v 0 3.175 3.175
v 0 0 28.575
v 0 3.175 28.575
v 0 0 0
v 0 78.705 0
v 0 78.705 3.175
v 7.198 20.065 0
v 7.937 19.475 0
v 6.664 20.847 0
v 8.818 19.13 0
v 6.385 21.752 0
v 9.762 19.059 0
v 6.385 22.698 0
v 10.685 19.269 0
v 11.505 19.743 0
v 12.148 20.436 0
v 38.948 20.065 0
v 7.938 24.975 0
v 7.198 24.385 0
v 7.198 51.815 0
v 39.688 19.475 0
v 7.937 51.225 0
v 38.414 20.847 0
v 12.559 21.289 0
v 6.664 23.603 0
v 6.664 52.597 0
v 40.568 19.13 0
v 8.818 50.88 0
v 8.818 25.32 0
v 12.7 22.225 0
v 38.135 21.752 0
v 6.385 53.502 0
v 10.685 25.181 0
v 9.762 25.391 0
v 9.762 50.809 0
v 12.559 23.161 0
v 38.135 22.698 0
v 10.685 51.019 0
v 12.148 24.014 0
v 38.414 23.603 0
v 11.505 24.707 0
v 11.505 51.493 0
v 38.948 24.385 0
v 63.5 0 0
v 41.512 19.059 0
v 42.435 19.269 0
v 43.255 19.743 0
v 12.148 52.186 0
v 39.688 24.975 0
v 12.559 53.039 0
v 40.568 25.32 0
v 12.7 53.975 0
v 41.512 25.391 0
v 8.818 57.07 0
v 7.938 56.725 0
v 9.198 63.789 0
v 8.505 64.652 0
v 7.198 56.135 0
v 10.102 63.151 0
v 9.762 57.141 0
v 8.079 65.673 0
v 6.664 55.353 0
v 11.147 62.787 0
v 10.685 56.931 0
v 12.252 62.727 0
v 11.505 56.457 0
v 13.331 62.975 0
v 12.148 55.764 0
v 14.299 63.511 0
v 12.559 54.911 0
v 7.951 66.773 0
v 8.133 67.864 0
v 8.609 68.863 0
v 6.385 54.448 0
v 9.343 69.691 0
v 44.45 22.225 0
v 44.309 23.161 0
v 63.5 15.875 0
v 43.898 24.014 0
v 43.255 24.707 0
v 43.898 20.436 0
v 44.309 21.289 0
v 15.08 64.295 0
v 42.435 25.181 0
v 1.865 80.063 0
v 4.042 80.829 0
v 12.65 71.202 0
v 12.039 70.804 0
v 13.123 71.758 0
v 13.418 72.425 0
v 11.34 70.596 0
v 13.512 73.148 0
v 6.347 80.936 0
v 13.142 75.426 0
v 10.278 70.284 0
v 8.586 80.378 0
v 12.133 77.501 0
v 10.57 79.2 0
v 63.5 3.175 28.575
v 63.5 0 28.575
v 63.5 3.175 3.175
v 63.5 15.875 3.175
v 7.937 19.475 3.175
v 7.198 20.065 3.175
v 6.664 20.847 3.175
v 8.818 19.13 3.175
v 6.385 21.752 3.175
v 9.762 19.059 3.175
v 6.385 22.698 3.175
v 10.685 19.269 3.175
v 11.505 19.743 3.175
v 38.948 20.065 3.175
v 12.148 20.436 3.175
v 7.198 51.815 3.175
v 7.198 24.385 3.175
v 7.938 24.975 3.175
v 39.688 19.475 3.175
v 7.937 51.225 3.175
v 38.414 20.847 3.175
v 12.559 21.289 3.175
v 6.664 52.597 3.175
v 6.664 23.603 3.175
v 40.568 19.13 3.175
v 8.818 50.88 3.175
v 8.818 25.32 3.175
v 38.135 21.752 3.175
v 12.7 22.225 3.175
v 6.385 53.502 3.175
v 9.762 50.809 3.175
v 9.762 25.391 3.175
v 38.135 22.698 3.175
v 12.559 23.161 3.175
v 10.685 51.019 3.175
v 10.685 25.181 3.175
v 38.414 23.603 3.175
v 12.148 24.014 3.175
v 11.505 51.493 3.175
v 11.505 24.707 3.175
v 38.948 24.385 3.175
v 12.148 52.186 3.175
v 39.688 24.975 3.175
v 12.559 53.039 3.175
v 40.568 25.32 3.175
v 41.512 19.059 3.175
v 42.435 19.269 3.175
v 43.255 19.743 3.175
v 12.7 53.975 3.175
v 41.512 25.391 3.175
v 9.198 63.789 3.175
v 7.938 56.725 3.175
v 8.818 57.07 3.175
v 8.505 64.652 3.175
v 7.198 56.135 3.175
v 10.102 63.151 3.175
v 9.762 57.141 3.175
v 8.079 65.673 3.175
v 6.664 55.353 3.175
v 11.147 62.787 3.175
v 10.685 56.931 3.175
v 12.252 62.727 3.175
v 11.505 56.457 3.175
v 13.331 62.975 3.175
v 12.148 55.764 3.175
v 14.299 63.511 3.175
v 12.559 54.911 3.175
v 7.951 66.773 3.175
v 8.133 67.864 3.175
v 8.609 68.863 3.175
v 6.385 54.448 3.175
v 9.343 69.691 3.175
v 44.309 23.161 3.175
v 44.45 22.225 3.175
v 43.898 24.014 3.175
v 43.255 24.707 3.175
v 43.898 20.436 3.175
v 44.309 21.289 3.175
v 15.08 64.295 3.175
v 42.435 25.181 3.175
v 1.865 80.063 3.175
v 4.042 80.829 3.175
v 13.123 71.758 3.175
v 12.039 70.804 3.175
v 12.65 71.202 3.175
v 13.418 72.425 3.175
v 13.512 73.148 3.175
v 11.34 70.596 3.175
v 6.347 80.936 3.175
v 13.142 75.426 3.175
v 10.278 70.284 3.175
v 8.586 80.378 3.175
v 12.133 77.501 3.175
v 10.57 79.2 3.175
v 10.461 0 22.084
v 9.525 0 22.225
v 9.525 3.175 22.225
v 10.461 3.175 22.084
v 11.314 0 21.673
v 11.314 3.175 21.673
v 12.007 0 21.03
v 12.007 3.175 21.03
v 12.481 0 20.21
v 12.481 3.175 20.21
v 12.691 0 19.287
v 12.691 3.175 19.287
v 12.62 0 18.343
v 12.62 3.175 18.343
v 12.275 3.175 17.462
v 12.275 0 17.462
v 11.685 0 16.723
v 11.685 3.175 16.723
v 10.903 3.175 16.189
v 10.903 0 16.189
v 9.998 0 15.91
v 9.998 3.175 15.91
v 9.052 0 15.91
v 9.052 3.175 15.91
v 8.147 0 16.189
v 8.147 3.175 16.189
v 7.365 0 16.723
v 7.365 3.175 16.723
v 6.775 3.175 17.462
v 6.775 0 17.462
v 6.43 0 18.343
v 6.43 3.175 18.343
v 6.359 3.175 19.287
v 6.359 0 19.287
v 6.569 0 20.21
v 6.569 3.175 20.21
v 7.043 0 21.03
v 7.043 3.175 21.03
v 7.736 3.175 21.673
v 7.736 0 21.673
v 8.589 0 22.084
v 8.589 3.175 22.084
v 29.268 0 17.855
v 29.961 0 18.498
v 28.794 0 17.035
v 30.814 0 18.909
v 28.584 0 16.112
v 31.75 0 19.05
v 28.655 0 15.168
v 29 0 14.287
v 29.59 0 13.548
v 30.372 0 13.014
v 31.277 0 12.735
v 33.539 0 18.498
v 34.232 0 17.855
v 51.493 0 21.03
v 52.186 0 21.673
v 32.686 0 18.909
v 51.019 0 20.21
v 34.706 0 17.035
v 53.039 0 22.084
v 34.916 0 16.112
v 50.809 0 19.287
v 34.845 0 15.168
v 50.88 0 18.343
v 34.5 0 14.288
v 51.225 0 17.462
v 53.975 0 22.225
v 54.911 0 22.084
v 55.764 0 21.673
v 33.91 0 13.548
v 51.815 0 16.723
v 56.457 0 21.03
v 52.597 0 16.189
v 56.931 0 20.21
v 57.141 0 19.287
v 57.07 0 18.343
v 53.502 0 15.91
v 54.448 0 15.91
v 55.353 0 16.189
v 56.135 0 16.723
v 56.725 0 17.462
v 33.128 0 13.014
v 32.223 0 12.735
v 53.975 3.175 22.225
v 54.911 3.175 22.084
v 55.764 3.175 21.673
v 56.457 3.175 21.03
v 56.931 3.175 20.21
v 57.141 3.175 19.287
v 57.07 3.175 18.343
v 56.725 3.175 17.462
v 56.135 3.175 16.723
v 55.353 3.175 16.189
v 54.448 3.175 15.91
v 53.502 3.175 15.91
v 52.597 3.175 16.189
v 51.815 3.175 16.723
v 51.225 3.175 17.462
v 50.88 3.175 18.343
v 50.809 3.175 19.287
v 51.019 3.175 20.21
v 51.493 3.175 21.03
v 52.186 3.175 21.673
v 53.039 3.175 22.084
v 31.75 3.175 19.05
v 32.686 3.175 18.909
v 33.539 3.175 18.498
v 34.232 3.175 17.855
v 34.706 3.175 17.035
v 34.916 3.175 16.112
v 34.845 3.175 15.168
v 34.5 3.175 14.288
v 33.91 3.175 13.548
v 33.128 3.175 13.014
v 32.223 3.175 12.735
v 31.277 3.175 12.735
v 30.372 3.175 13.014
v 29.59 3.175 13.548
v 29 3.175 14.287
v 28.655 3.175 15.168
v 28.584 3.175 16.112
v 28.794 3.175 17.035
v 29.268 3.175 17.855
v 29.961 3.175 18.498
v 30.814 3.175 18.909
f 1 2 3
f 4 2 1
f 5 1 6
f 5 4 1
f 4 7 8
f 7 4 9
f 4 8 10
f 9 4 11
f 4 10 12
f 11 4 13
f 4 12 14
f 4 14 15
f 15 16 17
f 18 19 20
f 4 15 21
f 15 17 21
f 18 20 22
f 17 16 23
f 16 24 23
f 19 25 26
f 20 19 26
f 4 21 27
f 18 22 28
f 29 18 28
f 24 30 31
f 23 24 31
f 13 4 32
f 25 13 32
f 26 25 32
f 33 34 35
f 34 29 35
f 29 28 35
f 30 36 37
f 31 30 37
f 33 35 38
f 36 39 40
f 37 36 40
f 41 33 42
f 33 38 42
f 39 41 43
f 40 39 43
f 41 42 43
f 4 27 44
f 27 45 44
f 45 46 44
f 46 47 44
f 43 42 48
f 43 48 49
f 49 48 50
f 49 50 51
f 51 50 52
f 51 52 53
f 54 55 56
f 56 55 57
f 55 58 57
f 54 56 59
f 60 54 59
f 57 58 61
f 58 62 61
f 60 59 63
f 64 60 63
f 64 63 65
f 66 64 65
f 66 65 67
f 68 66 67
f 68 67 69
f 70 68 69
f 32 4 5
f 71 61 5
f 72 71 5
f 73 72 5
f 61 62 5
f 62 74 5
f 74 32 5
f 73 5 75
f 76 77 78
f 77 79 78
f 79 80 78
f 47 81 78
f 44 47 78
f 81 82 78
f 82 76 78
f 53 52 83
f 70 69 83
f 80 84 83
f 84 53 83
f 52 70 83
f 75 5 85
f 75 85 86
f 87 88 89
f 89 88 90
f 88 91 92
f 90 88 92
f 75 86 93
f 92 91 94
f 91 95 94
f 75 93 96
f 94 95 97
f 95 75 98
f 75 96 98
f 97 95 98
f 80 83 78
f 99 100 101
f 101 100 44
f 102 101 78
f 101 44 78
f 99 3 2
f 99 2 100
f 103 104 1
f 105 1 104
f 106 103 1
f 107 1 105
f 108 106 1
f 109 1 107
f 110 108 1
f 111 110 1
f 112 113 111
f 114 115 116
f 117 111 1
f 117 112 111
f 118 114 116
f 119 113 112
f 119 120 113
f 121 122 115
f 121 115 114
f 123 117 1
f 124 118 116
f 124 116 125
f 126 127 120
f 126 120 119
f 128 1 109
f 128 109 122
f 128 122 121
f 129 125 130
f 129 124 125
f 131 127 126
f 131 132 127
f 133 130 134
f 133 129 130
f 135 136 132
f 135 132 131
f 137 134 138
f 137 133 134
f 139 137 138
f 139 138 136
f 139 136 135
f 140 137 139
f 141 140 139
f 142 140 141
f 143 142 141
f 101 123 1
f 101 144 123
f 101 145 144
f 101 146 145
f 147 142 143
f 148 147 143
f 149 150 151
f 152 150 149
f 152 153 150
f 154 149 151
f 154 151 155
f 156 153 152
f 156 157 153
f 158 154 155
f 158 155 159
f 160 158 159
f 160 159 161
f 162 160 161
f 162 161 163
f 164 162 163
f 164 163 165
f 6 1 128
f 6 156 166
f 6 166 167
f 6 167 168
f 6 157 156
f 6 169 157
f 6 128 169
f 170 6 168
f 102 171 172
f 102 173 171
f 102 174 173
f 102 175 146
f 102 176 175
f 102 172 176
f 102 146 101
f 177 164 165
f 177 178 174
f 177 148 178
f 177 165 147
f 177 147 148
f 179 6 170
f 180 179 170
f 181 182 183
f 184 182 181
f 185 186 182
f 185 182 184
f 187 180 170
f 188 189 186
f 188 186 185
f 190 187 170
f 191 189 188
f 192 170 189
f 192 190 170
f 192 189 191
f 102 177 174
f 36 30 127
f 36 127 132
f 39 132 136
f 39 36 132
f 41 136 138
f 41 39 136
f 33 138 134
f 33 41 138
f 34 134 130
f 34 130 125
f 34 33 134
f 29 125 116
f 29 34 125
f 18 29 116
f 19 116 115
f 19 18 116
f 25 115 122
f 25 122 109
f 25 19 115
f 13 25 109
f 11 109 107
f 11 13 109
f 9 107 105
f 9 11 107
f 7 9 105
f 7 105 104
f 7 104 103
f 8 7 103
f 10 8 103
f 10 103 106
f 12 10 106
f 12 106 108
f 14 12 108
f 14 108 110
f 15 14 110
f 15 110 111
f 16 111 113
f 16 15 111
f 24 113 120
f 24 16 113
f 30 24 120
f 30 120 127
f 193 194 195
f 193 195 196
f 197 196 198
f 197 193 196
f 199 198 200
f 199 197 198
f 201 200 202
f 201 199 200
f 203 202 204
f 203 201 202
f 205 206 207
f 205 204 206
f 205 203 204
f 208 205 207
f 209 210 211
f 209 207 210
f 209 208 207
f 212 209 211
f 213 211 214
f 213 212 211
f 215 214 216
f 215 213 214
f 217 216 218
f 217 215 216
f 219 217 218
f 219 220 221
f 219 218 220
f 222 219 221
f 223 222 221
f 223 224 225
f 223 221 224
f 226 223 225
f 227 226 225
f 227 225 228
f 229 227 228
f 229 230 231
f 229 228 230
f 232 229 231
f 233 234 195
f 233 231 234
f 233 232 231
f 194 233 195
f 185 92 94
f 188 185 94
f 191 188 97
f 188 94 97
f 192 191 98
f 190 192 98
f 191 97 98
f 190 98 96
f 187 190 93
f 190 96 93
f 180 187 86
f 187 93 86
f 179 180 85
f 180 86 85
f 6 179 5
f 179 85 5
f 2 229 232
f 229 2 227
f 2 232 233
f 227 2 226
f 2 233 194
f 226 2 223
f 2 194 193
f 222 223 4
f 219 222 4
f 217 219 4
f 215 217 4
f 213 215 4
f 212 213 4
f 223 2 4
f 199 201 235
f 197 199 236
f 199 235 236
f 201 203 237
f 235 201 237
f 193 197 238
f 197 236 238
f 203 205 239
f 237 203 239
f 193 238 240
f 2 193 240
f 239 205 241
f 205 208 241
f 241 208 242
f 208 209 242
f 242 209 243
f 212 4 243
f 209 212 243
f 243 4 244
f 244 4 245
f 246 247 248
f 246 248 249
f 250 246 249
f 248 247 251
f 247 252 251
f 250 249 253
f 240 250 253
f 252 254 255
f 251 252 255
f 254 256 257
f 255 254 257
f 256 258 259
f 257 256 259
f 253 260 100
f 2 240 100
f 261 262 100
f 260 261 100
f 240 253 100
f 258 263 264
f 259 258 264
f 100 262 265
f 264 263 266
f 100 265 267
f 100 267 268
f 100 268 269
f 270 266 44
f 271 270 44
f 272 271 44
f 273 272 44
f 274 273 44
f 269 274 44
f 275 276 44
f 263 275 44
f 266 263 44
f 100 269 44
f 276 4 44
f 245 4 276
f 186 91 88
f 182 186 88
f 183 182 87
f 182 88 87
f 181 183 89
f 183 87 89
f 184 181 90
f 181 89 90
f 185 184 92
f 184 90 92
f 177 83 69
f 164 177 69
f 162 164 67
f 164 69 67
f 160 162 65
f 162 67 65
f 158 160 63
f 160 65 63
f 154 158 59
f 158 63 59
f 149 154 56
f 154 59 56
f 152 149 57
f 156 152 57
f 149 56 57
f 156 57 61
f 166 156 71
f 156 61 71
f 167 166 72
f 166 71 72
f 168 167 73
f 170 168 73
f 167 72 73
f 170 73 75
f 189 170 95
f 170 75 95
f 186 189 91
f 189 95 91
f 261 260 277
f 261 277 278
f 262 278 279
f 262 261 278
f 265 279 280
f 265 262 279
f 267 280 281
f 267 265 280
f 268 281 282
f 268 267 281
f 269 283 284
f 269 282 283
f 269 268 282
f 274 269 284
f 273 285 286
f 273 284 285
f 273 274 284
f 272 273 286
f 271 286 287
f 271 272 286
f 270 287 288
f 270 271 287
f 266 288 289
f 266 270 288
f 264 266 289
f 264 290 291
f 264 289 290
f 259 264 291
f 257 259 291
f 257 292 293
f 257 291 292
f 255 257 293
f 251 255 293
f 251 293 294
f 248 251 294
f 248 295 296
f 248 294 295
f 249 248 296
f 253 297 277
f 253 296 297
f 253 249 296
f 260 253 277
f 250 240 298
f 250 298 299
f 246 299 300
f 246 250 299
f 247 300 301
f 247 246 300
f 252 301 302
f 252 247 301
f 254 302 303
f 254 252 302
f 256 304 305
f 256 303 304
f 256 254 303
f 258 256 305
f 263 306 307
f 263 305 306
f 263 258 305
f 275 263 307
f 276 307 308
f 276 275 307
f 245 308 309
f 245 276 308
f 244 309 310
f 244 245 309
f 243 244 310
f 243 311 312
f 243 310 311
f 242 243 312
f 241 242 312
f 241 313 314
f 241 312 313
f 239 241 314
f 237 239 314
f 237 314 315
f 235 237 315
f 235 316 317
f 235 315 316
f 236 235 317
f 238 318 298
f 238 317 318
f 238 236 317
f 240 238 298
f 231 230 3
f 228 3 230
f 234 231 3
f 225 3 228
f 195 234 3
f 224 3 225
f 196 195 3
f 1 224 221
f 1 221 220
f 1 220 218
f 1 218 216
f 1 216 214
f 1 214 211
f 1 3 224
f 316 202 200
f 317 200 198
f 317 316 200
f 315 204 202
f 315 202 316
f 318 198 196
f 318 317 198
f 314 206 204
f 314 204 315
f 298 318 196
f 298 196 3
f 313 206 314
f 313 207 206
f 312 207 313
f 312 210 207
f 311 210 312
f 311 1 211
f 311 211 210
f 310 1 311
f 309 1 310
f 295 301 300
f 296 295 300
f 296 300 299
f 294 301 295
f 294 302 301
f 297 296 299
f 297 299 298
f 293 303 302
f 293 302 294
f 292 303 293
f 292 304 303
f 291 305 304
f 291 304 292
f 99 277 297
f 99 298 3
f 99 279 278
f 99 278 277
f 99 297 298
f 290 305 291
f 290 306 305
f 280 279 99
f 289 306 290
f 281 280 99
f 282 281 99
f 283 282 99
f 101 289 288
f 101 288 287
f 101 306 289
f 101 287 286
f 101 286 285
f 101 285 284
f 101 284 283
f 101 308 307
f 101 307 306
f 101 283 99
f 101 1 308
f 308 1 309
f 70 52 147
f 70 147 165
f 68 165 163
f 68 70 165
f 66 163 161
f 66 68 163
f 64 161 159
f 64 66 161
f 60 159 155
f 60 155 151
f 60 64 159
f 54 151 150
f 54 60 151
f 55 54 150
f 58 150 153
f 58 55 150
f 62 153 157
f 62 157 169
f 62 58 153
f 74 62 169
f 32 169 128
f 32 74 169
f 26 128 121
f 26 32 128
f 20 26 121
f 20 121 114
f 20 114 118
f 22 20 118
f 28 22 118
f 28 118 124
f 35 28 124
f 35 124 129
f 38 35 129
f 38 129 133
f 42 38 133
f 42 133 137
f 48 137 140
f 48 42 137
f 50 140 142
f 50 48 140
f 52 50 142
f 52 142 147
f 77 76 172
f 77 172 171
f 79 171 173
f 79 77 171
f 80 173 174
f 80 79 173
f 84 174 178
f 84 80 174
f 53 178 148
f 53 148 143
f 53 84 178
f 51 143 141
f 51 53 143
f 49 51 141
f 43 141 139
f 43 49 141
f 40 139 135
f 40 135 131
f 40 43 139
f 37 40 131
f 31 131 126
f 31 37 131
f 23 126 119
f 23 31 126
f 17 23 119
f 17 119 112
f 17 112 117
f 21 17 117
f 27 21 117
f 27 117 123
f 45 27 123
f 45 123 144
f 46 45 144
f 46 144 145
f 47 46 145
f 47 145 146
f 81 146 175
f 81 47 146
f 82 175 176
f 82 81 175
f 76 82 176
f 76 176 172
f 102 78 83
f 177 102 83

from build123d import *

# Parameters (mm, degrees)
SKETCH1_R               = 3.175
BOSS_EXTRUDE1_DEPTH     = 3.175
SKETCH2_W               = 63.5
SKETCH2_H               = 3.175
BOSS_EXTRUDE2_DEPTH     = 25.4
CUT_EXTRUDE1_DEPTH      = 105.410975214
CUT_EXTRUDE1_DEPTH_BACK = 105.410975214
SKETCH3_R               = 3.175


with BuildPart() as part:
    # Sketch1 → Boss-Extrude1 (new body)
    with BuildSketch(Plane.XY):
        with BuildLine():
            Line((0, 78.705067014), (0, 0))
            Line((0, 0), (63.5, 0))
            Line((63.5, 0), (63.5, 15.875))
            Line((63.5, 15.875), (15.080341671, 64.294658329))
            ThreePointArc((15.080341671, 64.294658329), (8.505408108, 64.65221549), (11.339511683, 70.595737627))
            ThreePointArc((11.339511683, 70.595737627), (12.906539417, 71.462906002), (13.511840983, 73.148482141))
            ThreePointArc((13.511840983, 73.148482141), (8.586326617, 80.377738088), (0, 78.705067014))
        make_face()
        with Locations((9.525, 22.225)):
            Circle(SKETCH1_R, mode=Mode.SUBTRACT)
        with Locations((41.275, 22.225)):
            Circle(SKETCH1_R, mode=Mode.SUBTRACT)
        with Locations((9.525, 53.975)):
            Circle(SKETCH1_R, mode=Mode.SUBTRACT)
    extrude(amount=BOSS_EXTRUDE1_DEPTH)

    # Sketch2 → Boss-Extrude2 (add)
    with BuildSketch(Plane.XY.offset(3.175)):
        with Locations((31.75, 1.5875)):
            Rectangle(SKETCH2_W, SKETCH2_H)
    extrude(amount=BOSS_EXTRUDE2_DEPTH)

    # Sketch3 → Cut-Extrude1 (cut, two sides: drawn at the far end of the back side and taken through both)
    with BuildSketch(Plane(origin=(0, 3.175, 0), x_dir=(1, 0, 0), z_dir=(0, 1, 0)).offset(-CUT_EXTRUDE1_DEPTH_BACK)):
        with Locations(Location((9.525, -19.05, 0), (0, 0, 270))):
            Circle(SKETCH3_R)
        with Locations(Location((53.975, -19.05, 0), (0, 0, 270))):
            Circle(SKETCH3_R)
        with Locations(Location((31.75, -15.875, 0), (0, 0, 270))):
            Circle(SKETCH3_R)
    extrude(amount=CUT_EXTRUDE1_DEPTH + CUT_EXTRUDE1_DEPTH_BACK, mode=Mode.SUBTRACT)


solid = part.part
